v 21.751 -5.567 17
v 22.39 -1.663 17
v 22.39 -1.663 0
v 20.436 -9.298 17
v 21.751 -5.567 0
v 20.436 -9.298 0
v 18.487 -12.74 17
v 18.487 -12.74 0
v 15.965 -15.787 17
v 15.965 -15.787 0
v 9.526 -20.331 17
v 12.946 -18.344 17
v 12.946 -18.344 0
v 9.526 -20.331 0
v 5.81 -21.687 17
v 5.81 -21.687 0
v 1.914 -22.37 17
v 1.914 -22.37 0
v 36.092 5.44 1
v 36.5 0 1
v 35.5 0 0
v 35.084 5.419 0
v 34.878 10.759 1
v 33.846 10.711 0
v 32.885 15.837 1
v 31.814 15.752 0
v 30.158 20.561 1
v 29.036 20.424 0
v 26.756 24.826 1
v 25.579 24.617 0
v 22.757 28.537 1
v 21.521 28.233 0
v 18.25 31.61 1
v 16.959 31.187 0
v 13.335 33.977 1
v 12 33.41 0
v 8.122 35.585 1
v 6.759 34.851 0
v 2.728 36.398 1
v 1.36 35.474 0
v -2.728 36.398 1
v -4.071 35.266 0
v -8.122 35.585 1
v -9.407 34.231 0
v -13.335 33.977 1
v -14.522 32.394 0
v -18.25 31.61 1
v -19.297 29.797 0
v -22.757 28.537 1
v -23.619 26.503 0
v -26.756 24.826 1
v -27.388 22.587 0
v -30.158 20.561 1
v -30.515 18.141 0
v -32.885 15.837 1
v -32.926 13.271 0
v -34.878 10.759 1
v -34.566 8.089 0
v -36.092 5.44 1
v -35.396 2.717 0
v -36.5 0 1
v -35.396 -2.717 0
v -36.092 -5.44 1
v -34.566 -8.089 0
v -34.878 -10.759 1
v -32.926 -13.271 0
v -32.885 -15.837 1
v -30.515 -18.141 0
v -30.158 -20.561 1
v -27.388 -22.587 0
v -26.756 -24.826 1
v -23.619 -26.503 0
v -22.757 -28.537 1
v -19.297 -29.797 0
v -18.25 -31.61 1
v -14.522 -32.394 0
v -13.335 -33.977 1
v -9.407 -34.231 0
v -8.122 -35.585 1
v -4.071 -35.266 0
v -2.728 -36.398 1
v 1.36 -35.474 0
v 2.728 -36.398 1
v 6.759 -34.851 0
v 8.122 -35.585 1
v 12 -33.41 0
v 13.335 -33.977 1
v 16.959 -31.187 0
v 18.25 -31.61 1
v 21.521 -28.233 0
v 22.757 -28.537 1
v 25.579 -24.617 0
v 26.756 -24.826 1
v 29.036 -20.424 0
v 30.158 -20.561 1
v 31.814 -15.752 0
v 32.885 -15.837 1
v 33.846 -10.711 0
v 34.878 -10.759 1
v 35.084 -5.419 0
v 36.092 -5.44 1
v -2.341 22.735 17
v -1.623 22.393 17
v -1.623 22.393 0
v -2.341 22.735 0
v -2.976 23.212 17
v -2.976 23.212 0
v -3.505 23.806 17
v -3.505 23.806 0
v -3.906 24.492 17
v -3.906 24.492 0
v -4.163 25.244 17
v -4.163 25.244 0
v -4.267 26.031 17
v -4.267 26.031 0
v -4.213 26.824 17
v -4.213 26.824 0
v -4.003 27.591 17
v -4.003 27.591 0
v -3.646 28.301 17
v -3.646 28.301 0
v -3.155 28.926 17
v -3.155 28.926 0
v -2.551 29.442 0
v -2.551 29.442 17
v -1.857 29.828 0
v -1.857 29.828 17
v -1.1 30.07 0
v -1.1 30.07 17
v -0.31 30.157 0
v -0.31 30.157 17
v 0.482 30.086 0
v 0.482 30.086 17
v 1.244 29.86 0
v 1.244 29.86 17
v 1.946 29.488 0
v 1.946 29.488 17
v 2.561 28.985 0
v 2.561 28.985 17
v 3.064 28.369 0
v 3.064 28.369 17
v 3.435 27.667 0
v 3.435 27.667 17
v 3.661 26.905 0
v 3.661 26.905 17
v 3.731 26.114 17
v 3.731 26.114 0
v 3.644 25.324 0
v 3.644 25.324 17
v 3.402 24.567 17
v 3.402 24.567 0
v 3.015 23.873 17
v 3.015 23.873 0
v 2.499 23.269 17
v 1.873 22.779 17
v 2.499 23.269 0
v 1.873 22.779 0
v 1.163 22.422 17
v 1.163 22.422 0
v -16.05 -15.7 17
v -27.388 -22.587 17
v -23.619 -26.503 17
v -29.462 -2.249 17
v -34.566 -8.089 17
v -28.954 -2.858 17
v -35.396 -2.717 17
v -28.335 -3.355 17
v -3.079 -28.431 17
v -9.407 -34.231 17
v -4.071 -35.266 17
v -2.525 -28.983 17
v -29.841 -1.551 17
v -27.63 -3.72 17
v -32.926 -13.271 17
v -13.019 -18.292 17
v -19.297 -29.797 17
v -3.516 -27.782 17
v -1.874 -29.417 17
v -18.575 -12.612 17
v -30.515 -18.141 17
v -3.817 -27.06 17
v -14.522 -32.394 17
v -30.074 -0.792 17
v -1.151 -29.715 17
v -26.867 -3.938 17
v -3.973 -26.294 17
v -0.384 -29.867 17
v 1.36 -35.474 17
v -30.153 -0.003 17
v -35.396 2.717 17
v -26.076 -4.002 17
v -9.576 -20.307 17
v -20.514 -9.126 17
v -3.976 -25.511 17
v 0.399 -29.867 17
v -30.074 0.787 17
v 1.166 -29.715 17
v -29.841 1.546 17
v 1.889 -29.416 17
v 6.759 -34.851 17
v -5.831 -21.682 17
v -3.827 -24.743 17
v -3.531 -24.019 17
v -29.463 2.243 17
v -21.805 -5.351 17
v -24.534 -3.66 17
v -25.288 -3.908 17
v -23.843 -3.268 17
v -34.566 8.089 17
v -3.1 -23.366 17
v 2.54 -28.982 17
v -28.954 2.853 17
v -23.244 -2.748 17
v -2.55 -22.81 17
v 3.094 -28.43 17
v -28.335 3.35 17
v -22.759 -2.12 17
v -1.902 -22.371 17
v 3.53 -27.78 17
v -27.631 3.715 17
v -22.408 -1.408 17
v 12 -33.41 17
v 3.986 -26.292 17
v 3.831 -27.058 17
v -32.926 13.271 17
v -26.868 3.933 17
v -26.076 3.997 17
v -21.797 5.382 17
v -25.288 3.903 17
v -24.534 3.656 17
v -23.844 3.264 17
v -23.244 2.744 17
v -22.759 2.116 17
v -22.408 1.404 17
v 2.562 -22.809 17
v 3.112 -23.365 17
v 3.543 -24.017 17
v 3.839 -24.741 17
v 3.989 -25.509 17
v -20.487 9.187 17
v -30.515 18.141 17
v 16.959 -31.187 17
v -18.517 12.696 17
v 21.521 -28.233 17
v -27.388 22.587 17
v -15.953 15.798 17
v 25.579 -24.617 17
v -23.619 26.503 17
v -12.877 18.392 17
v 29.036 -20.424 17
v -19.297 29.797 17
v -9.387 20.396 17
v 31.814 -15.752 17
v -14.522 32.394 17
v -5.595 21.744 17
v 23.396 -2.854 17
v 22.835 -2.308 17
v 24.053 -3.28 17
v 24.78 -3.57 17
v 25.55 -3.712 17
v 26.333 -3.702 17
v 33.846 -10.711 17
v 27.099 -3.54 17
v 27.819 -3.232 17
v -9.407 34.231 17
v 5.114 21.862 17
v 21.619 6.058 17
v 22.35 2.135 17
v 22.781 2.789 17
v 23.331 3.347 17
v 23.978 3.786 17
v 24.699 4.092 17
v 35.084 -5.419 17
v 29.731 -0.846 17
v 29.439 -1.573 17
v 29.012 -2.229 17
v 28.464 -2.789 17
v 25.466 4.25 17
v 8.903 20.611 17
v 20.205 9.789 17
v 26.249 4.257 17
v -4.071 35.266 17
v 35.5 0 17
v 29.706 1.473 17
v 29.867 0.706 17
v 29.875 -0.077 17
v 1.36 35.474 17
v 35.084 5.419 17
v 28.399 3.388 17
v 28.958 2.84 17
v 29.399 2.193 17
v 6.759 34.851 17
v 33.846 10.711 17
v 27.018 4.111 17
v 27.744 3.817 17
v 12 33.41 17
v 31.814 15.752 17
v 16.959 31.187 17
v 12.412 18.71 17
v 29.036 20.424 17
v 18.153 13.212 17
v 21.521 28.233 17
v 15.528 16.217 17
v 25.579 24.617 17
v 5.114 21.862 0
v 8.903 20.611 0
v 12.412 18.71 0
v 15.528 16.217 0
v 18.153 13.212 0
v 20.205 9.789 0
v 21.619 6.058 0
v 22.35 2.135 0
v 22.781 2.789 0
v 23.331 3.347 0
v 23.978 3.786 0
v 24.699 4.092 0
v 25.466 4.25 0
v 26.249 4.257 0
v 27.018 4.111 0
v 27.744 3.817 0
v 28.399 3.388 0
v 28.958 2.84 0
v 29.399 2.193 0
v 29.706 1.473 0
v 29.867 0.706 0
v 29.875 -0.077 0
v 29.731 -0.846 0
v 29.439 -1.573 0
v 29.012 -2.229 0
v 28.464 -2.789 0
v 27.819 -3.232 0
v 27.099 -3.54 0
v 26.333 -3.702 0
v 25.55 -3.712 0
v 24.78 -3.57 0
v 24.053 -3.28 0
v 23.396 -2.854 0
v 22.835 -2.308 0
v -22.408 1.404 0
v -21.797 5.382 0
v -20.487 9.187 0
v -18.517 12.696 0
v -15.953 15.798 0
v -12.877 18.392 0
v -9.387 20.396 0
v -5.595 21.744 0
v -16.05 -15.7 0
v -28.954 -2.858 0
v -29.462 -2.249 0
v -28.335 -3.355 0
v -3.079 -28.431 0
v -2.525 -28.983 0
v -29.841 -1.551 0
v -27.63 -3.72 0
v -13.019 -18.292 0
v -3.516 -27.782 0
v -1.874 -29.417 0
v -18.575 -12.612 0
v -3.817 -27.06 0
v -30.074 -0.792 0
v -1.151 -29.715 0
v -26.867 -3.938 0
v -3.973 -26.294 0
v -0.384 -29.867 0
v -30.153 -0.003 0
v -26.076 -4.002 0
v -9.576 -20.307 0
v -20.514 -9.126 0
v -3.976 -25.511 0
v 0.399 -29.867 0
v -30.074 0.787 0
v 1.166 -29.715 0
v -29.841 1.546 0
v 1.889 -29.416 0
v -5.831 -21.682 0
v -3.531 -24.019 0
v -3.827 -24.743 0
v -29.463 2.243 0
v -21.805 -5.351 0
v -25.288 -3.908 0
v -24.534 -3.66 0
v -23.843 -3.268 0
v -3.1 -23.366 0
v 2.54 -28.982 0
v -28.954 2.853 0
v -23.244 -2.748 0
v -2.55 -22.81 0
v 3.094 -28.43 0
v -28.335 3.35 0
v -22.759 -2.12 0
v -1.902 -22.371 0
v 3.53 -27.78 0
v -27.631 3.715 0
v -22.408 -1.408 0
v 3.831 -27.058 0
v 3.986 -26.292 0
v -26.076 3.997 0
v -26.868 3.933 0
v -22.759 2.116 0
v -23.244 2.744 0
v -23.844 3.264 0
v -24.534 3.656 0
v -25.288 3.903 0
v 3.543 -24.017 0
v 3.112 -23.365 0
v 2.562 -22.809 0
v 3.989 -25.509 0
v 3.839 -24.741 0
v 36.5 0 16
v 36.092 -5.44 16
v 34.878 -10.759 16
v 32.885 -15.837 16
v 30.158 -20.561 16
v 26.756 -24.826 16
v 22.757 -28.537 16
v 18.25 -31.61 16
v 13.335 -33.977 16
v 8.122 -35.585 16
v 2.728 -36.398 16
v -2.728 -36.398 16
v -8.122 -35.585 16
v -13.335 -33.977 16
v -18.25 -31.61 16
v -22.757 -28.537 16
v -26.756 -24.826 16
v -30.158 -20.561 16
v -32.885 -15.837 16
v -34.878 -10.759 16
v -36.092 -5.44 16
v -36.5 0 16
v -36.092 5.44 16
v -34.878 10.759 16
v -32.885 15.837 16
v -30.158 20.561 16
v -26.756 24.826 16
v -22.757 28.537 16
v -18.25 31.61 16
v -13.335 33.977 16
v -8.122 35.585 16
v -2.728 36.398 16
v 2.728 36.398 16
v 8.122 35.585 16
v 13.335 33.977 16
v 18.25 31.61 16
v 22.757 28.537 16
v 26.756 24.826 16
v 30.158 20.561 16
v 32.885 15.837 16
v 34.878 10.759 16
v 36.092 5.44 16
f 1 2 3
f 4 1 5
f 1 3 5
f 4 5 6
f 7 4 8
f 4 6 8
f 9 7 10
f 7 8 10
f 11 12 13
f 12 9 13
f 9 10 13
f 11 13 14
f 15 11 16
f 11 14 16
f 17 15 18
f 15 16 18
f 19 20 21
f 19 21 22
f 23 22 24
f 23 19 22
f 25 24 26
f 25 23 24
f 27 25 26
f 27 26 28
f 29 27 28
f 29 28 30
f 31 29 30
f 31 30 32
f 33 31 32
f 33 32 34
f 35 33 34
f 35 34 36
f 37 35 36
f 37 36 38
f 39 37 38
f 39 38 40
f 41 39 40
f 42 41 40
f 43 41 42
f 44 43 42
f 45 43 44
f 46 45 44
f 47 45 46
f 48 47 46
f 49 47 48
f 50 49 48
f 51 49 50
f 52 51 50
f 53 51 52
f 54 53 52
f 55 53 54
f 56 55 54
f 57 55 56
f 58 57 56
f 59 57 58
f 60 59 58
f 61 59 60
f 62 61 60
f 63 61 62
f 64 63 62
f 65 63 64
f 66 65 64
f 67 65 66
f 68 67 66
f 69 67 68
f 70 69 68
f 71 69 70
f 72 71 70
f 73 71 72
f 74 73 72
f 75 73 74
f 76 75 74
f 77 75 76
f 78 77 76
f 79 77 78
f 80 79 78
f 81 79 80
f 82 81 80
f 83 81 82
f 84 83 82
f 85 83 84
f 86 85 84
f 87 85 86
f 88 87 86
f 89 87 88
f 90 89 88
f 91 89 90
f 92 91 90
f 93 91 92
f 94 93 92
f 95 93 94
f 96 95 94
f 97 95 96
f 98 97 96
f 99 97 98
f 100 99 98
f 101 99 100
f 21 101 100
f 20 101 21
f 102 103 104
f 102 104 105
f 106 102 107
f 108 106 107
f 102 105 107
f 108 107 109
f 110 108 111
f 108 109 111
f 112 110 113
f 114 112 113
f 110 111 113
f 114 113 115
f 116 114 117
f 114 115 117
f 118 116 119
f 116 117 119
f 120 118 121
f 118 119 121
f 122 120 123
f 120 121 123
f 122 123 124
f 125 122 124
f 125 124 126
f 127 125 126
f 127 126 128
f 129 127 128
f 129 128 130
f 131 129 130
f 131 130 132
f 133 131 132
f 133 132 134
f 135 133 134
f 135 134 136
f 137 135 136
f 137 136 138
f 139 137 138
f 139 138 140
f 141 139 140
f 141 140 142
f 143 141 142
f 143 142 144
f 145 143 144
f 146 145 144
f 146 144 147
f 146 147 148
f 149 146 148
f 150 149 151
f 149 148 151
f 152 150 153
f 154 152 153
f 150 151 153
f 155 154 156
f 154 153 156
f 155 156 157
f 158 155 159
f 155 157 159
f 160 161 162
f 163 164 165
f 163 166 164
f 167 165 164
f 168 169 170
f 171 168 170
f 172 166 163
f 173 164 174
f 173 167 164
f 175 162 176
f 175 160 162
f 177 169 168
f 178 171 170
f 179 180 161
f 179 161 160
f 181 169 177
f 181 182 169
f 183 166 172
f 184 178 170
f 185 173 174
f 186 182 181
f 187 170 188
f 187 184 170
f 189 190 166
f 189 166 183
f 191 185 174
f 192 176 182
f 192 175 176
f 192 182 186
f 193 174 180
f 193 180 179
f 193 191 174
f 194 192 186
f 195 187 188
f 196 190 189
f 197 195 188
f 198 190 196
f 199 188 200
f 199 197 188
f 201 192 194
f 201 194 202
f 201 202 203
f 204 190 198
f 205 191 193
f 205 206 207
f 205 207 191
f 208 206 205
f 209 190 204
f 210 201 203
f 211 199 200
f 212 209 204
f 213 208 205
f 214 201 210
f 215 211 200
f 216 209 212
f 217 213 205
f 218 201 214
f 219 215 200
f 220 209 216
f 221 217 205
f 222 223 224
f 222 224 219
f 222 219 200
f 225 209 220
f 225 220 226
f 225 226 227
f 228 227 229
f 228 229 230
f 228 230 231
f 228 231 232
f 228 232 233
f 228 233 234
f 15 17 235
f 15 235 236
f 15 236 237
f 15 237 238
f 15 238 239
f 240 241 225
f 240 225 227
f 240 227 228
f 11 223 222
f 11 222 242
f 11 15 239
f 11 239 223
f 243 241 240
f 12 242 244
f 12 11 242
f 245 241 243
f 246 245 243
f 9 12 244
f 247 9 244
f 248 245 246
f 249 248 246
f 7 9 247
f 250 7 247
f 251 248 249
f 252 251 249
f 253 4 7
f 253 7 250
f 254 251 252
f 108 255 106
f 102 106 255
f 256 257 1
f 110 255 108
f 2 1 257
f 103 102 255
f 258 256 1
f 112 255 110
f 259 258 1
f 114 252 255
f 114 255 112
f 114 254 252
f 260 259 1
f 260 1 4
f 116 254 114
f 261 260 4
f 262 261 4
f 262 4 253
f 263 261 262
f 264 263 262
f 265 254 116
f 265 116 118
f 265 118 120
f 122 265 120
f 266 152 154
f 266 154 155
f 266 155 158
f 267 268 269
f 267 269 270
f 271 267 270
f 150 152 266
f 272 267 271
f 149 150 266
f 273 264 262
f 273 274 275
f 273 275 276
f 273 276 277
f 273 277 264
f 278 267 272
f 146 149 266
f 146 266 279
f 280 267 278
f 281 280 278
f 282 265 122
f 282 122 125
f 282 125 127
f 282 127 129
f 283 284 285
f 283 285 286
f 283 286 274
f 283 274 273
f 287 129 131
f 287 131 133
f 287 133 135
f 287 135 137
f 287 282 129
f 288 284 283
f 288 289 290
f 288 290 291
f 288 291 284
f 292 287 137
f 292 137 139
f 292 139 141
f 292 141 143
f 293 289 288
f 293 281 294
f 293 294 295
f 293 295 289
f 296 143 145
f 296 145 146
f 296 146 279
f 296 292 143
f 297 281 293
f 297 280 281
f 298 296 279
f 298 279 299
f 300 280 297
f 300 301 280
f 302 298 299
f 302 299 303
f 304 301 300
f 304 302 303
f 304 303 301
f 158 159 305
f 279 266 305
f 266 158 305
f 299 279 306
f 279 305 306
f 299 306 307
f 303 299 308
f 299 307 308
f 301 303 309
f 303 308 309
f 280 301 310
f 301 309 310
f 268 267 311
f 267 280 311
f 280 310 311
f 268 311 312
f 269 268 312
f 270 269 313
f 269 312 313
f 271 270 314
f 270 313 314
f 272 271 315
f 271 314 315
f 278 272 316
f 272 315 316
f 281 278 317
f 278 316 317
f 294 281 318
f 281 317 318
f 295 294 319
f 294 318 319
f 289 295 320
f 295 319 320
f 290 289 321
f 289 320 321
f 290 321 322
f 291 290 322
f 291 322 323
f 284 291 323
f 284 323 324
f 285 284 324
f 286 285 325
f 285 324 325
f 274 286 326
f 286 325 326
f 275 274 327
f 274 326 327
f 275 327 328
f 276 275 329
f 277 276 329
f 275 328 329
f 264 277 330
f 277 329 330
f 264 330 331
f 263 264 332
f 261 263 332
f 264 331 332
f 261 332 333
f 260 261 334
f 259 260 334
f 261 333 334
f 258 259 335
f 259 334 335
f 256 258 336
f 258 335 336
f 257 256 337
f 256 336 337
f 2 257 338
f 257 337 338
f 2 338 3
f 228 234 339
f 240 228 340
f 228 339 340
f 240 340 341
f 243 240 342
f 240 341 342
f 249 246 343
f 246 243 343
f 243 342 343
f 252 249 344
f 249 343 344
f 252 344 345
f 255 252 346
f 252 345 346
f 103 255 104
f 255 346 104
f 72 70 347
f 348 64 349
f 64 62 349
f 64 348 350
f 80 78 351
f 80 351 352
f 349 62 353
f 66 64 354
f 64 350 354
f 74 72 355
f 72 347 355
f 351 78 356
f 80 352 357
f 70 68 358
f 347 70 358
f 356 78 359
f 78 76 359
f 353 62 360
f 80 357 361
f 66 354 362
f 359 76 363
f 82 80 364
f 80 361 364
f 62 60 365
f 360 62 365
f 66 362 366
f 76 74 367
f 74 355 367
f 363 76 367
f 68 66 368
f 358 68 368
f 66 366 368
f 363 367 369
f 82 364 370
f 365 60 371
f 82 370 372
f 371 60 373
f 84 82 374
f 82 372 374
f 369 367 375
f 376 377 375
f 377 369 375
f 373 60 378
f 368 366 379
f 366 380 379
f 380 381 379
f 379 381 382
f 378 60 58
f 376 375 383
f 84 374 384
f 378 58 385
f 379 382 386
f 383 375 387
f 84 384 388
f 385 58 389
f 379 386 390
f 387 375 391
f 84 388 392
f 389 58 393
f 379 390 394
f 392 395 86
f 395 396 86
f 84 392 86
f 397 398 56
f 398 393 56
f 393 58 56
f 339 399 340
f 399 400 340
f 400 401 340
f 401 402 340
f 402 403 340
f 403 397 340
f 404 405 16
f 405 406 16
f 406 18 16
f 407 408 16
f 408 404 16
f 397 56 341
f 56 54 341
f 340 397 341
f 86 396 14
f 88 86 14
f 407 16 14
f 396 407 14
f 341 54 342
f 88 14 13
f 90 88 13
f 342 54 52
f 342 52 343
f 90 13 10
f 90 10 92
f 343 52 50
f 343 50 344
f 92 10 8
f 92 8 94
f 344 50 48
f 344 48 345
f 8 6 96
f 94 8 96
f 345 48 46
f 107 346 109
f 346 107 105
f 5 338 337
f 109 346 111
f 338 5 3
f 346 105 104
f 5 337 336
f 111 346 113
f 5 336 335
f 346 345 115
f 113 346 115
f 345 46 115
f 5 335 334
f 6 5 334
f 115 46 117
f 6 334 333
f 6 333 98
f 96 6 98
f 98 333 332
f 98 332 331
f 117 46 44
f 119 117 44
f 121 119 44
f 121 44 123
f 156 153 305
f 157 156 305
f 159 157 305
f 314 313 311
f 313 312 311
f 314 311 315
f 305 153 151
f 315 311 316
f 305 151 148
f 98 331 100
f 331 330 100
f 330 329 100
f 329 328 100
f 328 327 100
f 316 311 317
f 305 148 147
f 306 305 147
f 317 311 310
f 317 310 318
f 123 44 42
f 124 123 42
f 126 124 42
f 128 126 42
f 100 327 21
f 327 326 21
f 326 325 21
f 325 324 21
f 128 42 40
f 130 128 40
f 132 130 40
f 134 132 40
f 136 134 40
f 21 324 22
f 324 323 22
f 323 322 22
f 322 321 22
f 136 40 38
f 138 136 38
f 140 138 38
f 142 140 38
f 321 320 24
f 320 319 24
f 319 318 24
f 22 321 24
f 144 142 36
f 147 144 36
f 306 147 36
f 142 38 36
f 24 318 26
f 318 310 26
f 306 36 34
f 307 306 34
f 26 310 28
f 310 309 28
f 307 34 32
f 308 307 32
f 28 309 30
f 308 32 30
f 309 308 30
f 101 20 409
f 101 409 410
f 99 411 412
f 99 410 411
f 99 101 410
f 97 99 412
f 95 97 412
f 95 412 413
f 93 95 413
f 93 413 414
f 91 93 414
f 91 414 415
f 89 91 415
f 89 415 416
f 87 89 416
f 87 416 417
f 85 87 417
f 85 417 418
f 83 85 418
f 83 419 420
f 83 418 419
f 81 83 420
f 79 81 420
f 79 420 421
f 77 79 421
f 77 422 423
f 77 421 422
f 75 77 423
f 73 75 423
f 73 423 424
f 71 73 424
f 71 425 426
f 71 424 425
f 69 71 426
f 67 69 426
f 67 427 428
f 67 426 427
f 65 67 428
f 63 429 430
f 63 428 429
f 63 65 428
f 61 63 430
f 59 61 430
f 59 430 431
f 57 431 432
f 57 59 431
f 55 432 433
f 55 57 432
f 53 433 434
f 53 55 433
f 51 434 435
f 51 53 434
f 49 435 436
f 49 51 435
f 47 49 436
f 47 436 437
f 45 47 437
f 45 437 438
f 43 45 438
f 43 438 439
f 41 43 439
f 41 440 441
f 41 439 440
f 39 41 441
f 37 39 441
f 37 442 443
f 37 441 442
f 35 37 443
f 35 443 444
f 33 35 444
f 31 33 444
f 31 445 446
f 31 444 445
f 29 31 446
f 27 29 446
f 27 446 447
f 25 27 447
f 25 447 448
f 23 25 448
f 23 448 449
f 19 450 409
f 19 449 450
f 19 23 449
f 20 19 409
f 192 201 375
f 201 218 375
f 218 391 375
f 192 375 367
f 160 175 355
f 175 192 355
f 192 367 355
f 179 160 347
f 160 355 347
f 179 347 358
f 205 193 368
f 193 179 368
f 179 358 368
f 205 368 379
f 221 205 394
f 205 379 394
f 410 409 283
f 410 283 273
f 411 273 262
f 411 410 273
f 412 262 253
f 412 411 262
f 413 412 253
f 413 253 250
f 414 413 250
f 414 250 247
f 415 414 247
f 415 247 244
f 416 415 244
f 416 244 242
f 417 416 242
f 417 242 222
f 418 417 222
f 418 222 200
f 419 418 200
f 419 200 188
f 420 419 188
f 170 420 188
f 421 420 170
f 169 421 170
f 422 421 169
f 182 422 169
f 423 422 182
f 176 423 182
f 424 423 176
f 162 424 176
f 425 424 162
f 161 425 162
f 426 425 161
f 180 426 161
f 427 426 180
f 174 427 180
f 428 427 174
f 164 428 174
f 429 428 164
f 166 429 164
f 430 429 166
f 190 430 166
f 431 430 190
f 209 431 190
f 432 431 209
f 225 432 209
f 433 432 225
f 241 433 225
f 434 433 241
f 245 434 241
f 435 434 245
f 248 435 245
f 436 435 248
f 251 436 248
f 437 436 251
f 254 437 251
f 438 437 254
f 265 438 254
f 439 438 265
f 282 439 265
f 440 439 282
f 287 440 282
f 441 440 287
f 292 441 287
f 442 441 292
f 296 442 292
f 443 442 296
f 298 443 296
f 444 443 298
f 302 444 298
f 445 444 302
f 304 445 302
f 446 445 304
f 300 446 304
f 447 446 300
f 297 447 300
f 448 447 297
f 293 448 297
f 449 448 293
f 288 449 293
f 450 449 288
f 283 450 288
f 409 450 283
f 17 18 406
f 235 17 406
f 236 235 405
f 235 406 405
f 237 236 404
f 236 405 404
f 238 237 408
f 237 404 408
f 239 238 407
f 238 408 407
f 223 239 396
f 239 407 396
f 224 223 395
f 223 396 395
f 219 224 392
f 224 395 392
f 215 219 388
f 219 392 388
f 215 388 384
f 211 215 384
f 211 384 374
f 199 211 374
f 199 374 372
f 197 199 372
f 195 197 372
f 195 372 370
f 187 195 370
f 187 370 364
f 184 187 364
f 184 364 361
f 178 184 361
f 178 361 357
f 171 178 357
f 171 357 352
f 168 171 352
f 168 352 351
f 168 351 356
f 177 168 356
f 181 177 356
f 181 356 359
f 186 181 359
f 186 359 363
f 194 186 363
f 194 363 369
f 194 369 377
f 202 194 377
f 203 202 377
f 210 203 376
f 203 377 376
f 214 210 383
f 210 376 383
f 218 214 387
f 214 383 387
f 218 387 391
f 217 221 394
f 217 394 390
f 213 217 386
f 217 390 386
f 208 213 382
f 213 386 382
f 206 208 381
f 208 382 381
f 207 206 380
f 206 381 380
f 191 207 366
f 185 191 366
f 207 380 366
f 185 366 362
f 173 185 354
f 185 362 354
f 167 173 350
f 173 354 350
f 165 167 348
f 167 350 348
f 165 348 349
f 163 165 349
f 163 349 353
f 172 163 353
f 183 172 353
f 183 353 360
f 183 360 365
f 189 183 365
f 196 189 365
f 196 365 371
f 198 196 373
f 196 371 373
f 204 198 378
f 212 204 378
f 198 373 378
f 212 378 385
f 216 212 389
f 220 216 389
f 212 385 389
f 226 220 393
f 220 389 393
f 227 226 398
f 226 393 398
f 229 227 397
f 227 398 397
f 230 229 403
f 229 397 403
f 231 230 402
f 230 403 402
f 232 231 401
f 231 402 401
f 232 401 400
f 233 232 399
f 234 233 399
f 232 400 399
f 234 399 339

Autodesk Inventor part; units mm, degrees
ref_plane "YZ Plane" through (0, 0, 0) normal (1, 0, 0) x (0, 1, 0)
ref_plane "XZ Plane" through (0, 0, 0) normal (0, 1, 0) x (-1, 0, 0)
ref_plane "XY Plane" through (0, 0, 0) normal (0, 0, 1) x (1, 0, 0)
sketch "Эскиз1" plane through (0, 0, 0) normal (0, 0, 1) x (1, 0, 0)
  circle A0 centre (0, 0) radius 22.452
  circle A1 centre (0, 0) radius 36.5
  dimension "d5" = 73
extrude "Выдавливание1" add sketch "Эскиз1" along normal blind 17
chamfer "Фаска1" distance 1 angle 45 2 edges at (-36.5, 0, 0) (-36.5, 0, 17)
sketch "Эскиз2" plane through (0, 0, 17) normal (0, 0, 1) x (1, 0, 0)
  point P0 (-26.1526, -0.0024)
  point P1 (-0.2687, 26.1569)
  point P2 (25.8905, 0.273)
  point P3 (0.0066, -25.8863)
hole "Отверстие1" at (-26.1526, -0.0024, 17) at (-0.2687, 26.1569, 17) at (25.8905, 0.273, 17) at (0.0066, -25.8863, 17) direction (0, 0, -1) diameter 8 end through all
properties part number "Magnetic"
